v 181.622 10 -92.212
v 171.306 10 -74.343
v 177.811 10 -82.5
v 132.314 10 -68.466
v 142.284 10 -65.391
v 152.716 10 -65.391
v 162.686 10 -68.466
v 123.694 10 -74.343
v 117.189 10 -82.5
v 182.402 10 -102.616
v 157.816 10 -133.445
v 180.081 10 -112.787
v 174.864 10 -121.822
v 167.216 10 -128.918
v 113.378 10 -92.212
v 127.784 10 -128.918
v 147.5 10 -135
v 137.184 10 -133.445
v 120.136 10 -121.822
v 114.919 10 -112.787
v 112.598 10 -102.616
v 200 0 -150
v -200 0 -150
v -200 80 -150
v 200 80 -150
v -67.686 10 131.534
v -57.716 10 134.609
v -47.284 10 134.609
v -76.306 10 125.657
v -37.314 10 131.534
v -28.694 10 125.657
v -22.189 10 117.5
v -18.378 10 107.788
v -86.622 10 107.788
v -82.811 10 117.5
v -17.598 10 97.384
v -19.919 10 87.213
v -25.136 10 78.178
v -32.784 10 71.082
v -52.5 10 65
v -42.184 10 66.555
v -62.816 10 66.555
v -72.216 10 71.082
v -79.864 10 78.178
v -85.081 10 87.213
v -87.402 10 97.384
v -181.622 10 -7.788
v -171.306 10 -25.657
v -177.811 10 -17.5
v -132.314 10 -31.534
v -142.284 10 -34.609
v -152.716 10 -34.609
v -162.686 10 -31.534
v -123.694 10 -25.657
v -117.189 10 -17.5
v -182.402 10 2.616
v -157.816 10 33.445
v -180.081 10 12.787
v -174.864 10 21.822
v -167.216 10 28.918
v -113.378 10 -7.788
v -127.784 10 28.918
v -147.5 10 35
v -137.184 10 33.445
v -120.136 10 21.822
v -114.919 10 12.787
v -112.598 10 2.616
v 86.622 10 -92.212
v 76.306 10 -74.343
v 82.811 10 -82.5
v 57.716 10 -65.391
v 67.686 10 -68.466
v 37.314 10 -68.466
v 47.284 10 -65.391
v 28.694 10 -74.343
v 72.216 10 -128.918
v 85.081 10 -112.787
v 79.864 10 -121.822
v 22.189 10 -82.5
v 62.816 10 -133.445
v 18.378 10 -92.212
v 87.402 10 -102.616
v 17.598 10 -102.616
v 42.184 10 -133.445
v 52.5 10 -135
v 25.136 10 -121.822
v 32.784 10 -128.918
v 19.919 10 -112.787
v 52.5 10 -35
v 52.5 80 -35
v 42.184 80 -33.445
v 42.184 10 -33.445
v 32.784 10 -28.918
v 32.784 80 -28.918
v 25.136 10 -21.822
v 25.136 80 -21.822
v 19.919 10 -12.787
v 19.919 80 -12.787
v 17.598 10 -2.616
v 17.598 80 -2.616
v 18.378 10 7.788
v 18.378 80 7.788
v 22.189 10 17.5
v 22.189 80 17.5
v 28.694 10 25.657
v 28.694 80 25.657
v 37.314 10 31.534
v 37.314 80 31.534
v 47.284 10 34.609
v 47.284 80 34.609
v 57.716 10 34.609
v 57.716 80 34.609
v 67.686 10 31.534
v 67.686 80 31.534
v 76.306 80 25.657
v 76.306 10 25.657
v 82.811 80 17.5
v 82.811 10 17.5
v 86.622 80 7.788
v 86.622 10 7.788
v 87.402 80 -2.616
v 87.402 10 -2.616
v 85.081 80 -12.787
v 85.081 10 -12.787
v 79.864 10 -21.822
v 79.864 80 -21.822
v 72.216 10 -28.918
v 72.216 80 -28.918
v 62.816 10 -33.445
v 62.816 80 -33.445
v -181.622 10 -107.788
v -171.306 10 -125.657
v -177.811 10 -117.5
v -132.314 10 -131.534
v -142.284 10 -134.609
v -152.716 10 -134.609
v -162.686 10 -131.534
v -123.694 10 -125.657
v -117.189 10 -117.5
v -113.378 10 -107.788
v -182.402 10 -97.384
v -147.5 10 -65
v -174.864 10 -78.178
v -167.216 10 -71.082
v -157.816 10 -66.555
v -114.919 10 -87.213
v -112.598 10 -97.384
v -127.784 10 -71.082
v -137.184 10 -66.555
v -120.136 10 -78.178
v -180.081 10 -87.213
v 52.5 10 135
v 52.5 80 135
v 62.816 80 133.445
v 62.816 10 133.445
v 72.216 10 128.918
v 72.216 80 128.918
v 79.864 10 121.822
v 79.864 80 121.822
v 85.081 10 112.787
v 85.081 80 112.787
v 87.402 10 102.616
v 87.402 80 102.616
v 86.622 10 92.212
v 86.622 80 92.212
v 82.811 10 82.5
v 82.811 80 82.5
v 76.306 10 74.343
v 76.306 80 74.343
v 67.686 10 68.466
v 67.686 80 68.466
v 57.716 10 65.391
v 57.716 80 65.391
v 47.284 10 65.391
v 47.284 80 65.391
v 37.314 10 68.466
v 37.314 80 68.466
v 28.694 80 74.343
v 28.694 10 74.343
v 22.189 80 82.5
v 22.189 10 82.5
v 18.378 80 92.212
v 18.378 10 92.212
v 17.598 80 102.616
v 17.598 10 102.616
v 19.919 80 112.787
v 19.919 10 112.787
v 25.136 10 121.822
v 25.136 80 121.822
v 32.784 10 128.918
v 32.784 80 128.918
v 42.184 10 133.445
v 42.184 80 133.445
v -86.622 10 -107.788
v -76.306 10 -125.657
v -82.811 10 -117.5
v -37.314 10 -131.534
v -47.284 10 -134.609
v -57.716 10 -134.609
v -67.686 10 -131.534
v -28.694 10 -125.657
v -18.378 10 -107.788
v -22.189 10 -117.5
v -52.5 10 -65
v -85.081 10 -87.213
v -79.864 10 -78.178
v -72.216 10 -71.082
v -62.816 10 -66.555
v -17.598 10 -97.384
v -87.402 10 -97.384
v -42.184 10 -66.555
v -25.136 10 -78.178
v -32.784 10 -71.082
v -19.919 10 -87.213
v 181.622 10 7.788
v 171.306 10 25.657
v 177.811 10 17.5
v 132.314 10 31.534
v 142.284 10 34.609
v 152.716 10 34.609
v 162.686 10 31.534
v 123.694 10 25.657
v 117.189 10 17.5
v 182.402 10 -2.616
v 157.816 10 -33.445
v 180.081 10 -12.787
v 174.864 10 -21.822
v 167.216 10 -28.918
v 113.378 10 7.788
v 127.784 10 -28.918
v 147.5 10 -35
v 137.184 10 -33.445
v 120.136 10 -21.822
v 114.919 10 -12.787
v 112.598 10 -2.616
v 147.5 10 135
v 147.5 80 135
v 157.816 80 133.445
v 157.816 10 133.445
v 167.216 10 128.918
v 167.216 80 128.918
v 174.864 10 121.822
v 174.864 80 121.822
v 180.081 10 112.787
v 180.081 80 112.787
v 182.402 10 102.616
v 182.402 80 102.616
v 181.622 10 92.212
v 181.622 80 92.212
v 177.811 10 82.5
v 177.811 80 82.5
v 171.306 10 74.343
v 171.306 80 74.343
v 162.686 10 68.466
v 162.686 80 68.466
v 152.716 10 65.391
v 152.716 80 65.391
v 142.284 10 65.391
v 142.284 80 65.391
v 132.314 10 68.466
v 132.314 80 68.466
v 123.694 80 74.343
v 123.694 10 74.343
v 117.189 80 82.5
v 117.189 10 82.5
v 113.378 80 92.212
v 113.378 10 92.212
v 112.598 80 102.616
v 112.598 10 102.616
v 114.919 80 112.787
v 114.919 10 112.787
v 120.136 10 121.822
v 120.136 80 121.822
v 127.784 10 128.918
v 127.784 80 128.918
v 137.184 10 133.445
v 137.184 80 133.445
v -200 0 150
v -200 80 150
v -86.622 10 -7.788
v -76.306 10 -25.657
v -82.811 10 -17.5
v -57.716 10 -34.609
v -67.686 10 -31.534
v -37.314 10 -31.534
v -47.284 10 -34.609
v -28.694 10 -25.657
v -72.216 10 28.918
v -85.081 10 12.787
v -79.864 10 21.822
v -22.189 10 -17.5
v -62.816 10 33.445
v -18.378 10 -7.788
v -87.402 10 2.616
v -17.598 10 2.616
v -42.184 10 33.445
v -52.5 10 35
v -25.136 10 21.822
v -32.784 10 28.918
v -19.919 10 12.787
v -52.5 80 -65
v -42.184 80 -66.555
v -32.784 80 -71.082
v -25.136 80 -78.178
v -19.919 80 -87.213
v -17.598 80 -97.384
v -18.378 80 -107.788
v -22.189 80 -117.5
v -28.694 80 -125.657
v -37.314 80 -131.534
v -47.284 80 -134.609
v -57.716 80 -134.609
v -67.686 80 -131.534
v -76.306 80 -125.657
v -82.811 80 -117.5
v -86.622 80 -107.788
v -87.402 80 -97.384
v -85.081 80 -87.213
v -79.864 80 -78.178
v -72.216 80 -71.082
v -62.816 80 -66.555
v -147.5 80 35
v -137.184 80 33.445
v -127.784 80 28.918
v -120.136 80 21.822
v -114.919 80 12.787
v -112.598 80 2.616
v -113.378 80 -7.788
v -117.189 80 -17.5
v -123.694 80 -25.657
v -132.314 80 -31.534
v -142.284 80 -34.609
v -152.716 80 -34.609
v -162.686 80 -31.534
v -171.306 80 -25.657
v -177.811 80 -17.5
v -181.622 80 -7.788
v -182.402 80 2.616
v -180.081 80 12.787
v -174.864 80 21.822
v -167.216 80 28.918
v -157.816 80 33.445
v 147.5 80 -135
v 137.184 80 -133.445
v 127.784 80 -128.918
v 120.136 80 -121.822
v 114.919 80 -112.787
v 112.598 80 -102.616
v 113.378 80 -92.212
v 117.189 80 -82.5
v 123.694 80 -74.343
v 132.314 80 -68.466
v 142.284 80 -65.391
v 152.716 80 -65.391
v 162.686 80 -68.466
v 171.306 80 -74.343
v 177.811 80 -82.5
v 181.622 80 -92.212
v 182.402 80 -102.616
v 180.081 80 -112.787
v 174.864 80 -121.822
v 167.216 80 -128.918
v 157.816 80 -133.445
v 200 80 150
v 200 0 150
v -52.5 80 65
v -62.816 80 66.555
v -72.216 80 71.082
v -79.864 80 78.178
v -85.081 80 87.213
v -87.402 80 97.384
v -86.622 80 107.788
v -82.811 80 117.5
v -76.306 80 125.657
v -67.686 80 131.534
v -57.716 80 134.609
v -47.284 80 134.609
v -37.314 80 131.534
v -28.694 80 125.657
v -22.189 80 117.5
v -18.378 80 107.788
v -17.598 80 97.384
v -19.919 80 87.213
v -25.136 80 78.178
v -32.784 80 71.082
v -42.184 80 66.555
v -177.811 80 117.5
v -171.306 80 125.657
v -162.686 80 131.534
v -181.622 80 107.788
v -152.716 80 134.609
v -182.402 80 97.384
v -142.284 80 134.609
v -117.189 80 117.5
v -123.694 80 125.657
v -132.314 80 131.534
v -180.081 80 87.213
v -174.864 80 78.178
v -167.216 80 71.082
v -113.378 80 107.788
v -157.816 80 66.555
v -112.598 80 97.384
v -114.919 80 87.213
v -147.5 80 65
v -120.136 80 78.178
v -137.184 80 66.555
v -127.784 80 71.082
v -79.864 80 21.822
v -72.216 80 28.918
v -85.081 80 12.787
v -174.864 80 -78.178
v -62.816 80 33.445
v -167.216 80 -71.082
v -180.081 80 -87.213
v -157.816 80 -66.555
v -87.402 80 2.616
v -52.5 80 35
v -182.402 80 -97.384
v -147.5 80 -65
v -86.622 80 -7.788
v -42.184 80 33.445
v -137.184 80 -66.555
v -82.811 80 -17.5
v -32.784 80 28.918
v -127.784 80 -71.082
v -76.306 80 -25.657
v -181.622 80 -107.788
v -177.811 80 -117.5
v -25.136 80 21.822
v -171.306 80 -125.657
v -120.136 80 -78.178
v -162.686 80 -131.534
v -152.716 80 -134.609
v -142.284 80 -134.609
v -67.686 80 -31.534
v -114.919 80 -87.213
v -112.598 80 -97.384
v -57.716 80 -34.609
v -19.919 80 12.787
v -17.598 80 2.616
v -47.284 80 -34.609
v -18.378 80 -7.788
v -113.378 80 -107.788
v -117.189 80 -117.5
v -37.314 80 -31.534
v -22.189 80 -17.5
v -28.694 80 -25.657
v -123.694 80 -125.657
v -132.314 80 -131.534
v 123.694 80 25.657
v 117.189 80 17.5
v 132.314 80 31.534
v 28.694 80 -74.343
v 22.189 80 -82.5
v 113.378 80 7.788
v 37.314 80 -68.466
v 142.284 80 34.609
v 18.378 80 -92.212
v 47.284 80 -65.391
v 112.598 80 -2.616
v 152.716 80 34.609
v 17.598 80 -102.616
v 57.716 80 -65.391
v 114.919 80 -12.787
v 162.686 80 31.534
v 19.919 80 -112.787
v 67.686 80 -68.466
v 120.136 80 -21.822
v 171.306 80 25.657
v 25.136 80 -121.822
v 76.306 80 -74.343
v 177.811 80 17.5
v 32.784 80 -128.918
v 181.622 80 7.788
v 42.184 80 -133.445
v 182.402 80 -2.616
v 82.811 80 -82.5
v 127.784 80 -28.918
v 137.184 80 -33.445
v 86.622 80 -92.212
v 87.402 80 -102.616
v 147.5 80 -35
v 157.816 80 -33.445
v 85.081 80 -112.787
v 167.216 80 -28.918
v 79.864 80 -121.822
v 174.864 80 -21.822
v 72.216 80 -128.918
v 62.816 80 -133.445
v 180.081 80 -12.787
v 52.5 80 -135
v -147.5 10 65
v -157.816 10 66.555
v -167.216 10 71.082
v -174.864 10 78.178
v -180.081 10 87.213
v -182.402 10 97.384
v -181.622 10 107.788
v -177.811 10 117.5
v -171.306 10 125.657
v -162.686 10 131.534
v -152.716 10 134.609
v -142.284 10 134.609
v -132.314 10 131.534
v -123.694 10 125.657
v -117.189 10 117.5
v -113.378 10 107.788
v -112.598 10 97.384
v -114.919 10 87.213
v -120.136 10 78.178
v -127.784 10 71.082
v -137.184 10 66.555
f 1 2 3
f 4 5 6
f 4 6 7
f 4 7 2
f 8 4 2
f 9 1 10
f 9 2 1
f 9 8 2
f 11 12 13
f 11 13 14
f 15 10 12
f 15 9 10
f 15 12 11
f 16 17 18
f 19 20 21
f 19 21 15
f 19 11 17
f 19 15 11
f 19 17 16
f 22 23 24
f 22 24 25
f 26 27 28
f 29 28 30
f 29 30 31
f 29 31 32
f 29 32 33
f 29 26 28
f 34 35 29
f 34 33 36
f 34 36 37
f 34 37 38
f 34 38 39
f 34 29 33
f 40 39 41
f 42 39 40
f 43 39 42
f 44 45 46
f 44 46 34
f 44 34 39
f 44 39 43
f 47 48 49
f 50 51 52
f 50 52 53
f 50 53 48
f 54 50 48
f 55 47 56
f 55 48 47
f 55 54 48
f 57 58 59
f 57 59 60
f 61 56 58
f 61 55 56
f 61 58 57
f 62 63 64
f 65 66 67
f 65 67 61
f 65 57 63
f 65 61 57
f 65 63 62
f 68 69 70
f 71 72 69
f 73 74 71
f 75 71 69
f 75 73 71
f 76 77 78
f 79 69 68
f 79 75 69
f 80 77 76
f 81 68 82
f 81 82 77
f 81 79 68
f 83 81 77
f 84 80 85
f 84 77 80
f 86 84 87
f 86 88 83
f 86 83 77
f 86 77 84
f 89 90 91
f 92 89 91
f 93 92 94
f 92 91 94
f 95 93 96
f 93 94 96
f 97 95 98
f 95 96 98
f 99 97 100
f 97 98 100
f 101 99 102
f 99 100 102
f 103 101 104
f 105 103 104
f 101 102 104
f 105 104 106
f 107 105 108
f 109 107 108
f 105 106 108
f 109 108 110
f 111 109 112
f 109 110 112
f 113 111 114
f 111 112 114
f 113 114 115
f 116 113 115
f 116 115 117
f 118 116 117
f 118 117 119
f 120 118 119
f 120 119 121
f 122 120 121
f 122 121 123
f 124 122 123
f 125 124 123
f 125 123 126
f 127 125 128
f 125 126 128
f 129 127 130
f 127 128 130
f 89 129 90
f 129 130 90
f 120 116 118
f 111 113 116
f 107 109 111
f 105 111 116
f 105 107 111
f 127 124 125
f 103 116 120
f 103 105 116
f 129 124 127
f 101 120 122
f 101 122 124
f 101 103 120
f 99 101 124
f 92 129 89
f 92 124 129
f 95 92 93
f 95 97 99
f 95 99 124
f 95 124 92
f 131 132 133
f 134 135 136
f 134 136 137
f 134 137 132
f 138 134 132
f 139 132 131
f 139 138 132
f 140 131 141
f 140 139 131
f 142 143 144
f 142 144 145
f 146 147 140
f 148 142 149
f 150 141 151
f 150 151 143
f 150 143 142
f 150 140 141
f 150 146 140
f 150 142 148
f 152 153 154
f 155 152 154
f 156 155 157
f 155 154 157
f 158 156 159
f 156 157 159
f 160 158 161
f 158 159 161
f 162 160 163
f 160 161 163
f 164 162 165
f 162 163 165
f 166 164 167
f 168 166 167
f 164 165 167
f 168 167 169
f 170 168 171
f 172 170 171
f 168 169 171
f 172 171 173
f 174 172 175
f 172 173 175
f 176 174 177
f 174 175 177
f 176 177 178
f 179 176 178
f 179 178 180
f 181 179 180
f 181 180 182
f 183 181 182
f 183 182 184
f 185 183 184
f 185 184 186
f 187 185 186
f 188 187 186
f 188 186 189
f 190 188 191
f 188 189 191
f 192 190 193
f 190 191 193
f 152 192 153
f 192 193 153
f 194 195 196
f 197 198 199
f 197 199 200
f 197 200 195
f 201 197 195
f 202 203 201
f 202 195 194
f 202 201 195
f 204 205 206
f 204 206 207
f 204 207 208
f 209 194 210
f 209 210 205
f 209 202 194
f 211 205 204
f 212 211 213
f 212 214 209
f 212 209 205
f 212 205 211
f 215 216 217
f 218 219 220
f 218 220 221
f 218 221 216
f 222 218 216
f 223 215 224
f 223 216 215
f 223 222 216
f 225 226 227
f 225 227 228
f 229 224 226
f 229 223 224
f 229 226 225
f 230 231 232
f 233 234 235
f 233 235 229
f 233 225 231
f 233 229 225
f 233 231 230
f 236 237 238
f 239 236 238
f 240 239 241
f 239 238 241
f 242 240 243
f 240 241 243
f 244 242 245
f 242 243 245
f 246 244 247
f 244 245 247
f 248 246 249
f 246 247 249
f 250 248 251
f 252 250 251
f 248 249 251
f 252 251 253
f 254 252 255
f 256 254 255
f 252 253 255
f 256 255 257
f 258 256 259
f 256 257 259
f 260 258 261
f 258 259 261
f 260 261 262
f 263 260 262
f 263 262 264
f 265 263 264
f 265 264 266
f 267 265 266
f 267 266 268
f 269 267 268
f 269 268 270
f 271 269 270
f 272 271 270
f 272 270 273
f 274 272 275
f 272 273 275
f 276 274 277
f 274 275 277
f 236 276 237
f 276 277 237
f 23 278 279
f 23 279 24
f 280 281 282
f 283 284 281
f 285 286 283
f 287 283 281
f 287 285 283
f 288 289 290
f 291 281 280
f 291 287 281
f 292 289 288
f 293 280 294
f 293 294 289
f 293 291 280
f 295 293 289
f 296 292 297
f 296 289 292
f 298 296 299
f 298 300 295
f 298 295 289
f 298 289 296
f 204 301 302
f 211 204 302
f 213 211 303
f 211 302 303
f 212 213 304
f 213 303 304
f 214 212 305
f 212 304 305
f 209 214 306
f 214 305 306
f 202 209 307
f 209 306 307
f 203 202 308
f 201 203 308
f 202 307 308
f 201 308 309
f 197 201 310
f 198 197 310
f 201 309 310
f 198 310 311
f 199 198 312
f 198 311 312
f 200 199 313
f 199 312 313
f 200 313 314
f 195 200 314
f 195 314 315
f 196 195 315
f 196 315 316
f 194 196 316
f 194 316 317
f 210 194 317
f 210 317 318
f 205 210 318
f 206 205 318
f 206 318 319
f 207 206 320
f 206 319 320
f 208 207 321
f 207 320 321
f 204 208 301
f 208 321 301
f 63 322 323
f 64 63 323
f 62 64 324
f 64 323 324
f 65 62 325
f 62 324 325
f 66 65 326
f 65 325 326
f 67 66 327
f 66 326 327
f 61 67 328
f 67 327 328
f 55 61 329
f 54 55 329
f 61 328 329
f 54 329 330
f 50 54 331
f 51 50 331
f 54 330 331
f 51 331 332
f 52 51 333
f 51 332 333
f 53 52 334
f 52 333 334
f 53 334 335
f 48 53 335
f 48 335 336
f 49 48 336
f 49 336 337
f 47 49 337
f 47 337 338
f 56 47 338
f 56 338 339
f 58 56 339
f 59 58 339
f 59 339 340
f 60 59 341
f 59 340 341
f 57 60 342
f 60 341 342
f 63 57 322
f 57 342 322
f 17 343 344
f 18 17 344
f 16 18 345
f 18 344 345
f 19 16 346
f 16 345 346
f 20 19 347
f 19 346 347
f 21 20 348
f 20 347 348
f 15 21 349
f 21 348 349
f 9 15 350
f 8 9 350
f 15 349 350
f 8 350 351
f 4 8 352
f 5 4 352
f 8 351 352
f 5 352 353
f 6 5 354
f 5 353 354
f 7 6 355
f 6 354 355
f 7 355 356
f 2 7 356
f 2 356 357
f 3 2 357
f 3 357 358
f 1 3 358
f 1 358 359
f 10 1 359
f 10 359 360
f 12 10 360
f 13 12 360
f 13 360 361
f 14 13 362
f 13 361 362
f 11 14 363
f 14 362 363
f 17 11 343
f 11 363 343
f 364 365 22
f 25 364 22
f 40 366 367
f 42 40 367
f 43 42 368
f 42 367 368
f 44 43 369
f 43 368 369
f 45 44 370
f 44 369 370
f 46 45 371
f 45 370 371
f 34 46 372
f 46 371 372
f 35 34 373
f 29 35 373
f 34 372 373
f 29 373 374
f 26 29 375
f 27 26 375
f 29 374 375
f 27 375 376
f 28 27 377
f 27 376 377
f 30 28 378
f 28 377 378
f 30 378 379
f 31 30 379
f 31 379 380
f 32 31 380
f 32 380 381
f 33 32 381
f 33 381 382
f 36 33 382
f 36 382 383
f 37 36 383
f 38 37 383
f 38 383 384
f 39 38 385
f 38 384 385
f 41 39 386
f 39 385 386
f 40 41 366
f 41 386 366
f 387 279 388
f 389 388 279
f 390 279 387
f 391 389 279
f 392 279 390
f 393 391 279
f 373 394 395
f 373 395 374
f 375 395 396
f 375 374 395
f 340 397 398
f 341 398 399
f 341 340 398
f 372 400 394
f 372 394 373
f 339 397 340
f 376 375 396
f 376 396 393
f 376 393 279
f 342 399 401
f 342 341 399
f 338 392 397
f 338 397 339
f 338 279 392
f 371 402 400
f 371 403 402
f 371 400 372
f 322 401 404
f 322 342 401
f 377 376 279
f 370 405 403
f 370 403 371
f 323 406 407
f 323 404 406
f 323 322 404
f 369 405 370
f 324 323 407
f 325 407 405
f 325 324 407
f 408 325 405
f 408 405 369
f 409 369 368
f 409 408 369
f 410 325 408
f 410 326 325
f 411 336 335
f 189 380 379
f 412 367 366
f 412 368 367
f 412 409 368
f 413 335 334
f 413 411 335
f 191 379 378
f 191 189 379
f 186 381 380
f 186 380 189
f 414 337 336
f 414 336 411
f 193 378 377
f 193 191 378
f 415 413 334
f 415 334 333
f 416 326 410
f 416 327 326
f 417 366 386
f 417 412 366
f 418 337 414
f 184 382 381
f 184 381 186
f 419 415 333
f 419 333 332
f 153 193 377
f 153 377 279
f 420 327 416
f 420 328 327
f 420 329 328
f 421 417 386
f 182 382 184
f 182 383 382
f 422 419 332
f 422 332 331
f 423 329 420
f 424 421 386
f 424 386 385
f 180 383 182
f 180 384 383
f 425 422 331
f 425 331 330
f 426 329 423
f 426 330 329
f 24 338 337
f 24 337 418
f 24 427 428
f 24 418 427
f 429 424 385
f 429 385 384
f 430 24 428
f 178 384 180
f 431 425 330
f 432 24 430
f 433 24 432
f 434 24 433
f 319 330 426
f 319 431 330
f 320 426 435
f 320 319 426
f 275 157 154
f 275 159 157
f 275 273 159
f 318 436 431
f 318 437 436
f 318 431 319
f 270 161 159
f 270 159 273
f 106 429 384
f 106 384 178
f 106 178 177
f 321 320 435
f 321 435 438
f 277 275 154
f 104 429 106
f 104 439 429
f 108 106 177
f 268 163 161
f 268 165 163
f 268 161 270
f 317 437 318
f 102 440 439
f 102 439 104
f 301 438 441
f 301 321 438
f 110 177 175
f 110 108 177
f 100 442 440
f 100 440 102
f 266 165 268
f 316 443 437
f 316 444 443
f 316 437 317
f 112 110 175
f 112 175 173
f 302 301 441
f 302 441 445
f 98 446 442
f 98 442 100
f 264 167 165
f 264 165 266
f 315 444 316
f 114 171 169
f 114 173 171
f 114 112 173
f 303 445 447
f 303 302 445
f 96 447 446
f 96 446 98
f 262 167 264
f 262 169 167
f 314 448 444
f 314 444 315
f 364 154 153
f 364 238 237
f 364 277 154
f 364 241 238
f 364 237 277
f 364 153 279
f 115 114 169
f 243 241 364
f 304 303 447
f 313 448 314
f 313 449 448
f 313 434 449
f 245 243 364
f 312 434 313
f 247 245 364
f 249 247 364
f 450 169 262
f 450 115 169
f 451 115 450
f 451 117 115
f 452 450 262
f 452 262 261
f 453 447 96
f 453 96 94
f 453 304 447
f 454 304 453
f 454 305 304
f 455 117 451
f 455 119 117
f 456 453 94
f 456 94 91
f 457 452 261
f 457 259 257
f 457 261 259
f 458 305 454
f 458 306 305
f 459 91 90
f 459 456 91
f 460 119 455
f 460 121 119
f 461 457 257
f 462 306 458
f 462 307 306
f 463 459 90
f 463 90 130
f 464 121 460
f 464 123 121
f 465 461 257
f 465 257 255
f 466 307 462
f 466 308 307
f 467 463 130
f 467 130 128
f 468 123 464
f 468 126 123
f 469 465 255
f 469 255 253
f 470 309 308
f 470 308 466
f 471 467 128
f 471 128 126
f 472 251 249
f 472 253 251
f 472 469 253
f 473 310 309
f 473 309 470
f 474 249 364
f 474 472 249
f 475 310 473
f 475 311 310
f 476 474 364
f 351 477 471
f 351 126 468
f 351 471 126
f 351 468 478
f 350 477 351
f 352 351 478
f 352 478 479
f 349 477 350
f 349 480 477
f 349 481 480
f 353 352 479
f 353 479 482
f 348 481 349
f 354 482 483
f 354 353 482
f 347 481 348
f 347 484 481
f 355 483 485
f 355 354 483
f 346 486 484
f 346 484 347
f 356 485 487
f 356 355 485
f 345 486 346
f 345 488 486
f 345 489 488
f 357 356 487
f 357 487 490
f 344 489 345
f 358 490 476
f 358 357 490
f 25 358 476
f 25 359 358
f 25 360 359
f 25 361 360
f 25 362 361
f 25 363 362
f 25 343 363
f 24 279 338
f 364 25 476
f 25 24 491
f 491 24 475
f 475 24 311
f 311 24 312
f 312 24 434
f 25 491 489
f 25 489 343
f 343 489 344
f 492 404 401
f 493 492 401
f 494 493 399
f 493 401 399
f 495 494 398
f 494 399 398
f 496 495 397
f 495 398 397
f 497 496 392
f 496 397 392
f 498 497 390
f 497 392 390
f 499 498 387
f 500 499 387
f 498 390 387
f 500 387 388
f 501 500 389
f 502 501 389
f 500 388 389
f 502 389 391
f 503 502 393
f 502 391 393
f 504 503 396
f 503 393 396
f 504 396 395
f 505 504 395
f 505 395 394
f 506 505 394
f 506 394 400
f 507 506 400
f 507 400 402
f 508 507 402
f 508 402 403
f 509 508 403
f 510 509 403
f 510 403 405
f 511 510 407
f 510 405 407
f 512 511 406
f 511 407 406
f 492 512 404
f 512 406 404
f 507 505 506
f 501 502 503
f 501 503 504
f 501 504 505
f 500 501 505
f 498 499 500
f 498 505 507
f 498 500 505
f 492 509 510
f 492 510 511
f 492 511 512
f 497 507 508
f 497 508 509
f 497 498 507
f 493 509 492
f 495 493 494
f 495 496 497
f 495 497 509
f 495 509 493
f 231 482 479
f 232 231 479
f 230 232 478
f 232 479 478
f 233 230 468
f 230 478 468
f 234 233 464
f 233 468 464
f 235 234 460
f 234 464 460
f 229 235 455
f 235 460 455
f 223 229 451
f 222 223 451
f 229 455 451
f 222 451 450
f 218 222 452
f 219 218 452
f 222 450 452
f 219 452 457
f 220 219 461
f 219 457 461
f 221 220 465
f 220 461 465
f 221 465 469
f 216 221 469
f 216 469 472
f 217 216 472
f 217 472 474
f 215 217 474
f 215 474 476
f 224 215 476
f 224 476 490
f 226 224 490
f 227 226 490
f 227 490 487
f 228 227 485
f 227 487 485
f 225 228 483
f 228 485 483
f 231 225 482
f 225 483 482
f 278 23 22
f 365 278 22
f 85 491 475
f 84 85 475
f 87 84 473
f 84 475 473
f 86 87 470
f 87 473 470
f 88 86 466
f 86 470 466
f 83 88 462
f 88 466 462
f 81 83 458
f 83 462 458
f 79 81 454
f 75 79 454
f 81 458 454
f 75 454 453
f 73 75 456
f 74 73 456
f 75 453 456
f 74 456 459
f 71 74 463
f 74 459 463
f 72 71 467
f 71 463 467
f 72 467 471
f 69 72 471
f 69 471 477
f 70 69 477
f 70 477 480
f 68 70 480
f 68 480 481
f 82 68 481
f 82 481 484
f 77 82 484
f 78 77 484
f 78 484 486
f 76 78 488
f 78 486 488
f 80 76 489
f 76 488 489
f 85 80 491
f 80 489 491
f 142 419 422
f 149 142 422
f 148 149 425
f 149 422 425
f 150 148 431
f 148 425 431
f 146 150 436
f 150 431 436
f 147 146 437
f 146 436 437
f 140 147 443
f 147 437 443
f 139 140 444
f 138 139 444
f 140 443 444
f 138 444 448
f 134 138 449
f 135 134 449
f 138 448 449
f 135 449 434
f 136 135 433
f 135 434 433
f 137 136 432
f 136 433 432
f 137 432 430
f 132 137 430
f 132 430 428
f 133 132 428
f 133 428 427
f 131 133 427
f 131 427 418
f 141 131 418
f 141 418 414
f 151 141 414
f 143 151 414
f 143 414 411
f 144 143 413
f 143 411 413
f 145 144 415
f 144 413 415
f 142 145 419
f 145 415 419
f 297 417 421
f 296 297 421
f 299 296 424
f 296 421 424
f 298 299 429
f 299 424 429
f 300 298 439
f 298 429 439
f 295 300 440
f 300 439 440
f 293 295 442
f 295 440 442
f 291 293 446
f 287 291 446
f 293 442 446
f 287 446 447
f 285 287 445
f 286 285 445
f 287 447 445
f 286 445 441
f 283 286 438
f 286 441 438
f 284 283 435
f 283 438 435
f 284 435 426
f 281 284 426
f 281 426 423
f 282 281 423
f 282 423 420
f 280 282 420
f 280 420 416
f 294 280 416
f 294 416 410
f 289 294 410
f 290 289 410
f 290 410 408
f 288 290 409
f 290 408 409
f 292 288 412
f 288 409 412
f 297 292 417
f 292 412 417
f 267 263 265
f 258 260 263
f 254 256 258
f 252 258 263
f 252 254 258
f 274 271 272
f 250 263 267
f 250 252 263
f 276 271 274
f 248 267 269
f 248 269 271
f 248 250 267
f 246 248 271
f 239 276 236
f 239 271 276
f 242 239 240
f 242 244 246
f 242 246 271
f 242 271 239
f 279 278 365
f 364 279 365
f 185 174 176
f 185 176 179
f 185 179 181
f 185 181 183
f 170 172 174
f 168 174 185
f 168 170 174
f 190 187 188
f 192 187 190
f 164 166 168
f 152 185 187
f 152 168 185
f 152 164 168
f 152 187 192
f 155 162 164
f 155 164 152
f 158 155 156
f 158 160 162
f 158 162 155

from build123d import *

# Parameters (mm, degrees)
CROQUIS1_W              = 400
CROQUIS1_H              = 300
SALIENTE_EXTRUIR1_DEPTH = 80
CROQUIS3_R              = 35
CORTAR_EXTRUIR1_DEPTH   = 70


with BuildPart() as part:
    # Croquis1 → Saliente-Extruir1 (new body)
    with BuildSketch(Plane(origin=(0, 0, 0), x_dir=(1, 0, 0), z_dir=(0, 1, 0))):
        Rectangle(CROQUIS1_W, CROQUIS1_H)
    extrude(amount=SALIENTE_EXTRUIR1_DEPTH)

    # Croquis3 → Cortar-Extruir1 (cut)
    with BuildSketch(Plane(origin=(0, 80, 0), x_dir=(1, 0, 0), z_dir=(0, 1, 0))):
        with Locations(Location((-147.5, 100, 0), (0, 0, 270))):
            Circle(CROQUIS3_R)
        with Locations(Location((-52.5, 100, 0), (0, 0, 270))):
            Circle(CROQUIS3_R)
        with Locations(Location((-147.5, 0, 0), (0, 0, 270))):
            Circle(CROQUIS3_R)
        with Locations(Location((-52.5, 0, 0), (0, 0, 270))):
            Circle(CROQUIS3_R)
        with Locations(Location((52.5, 0, 0), (0, 0, 90))):
            Circle(CROQUIS3_R)
        with Locations(Location((52.5, 100, 0), (0, 0, 90))):
            Circle(CROQUIS3_R)
        with Locations(Location((147.5, 0, 0), (0, 0, 90))):
            Circle(CROQUIS3_R)
        with Locations(Location((147.5, 100, 0), (0, 0, 90))):
            Circle(CROQUIS3_R)
        with Locations(Location((-52.5, -100, 0), (0, 0, 90))):
            Circle(CROQUIS3_R)
        with Locations(Location((-147.5, -100, 0), (0, 0, 90))):
            Circle(CROQUIS3_R)
        with Locations(Location((147.5, -100, 0), (0, 0, 270))):
            Circle(CROQUIS3_R)
        with Locations(Location((52.5, -100, 0), (0, 0, 270))):
            Circle(CROQUIS3_R)
    extrude(amount=-CORTAR_EXTRUIR1_DEPTH, mode=Mode.SUBTRACT)


solid = part.part
